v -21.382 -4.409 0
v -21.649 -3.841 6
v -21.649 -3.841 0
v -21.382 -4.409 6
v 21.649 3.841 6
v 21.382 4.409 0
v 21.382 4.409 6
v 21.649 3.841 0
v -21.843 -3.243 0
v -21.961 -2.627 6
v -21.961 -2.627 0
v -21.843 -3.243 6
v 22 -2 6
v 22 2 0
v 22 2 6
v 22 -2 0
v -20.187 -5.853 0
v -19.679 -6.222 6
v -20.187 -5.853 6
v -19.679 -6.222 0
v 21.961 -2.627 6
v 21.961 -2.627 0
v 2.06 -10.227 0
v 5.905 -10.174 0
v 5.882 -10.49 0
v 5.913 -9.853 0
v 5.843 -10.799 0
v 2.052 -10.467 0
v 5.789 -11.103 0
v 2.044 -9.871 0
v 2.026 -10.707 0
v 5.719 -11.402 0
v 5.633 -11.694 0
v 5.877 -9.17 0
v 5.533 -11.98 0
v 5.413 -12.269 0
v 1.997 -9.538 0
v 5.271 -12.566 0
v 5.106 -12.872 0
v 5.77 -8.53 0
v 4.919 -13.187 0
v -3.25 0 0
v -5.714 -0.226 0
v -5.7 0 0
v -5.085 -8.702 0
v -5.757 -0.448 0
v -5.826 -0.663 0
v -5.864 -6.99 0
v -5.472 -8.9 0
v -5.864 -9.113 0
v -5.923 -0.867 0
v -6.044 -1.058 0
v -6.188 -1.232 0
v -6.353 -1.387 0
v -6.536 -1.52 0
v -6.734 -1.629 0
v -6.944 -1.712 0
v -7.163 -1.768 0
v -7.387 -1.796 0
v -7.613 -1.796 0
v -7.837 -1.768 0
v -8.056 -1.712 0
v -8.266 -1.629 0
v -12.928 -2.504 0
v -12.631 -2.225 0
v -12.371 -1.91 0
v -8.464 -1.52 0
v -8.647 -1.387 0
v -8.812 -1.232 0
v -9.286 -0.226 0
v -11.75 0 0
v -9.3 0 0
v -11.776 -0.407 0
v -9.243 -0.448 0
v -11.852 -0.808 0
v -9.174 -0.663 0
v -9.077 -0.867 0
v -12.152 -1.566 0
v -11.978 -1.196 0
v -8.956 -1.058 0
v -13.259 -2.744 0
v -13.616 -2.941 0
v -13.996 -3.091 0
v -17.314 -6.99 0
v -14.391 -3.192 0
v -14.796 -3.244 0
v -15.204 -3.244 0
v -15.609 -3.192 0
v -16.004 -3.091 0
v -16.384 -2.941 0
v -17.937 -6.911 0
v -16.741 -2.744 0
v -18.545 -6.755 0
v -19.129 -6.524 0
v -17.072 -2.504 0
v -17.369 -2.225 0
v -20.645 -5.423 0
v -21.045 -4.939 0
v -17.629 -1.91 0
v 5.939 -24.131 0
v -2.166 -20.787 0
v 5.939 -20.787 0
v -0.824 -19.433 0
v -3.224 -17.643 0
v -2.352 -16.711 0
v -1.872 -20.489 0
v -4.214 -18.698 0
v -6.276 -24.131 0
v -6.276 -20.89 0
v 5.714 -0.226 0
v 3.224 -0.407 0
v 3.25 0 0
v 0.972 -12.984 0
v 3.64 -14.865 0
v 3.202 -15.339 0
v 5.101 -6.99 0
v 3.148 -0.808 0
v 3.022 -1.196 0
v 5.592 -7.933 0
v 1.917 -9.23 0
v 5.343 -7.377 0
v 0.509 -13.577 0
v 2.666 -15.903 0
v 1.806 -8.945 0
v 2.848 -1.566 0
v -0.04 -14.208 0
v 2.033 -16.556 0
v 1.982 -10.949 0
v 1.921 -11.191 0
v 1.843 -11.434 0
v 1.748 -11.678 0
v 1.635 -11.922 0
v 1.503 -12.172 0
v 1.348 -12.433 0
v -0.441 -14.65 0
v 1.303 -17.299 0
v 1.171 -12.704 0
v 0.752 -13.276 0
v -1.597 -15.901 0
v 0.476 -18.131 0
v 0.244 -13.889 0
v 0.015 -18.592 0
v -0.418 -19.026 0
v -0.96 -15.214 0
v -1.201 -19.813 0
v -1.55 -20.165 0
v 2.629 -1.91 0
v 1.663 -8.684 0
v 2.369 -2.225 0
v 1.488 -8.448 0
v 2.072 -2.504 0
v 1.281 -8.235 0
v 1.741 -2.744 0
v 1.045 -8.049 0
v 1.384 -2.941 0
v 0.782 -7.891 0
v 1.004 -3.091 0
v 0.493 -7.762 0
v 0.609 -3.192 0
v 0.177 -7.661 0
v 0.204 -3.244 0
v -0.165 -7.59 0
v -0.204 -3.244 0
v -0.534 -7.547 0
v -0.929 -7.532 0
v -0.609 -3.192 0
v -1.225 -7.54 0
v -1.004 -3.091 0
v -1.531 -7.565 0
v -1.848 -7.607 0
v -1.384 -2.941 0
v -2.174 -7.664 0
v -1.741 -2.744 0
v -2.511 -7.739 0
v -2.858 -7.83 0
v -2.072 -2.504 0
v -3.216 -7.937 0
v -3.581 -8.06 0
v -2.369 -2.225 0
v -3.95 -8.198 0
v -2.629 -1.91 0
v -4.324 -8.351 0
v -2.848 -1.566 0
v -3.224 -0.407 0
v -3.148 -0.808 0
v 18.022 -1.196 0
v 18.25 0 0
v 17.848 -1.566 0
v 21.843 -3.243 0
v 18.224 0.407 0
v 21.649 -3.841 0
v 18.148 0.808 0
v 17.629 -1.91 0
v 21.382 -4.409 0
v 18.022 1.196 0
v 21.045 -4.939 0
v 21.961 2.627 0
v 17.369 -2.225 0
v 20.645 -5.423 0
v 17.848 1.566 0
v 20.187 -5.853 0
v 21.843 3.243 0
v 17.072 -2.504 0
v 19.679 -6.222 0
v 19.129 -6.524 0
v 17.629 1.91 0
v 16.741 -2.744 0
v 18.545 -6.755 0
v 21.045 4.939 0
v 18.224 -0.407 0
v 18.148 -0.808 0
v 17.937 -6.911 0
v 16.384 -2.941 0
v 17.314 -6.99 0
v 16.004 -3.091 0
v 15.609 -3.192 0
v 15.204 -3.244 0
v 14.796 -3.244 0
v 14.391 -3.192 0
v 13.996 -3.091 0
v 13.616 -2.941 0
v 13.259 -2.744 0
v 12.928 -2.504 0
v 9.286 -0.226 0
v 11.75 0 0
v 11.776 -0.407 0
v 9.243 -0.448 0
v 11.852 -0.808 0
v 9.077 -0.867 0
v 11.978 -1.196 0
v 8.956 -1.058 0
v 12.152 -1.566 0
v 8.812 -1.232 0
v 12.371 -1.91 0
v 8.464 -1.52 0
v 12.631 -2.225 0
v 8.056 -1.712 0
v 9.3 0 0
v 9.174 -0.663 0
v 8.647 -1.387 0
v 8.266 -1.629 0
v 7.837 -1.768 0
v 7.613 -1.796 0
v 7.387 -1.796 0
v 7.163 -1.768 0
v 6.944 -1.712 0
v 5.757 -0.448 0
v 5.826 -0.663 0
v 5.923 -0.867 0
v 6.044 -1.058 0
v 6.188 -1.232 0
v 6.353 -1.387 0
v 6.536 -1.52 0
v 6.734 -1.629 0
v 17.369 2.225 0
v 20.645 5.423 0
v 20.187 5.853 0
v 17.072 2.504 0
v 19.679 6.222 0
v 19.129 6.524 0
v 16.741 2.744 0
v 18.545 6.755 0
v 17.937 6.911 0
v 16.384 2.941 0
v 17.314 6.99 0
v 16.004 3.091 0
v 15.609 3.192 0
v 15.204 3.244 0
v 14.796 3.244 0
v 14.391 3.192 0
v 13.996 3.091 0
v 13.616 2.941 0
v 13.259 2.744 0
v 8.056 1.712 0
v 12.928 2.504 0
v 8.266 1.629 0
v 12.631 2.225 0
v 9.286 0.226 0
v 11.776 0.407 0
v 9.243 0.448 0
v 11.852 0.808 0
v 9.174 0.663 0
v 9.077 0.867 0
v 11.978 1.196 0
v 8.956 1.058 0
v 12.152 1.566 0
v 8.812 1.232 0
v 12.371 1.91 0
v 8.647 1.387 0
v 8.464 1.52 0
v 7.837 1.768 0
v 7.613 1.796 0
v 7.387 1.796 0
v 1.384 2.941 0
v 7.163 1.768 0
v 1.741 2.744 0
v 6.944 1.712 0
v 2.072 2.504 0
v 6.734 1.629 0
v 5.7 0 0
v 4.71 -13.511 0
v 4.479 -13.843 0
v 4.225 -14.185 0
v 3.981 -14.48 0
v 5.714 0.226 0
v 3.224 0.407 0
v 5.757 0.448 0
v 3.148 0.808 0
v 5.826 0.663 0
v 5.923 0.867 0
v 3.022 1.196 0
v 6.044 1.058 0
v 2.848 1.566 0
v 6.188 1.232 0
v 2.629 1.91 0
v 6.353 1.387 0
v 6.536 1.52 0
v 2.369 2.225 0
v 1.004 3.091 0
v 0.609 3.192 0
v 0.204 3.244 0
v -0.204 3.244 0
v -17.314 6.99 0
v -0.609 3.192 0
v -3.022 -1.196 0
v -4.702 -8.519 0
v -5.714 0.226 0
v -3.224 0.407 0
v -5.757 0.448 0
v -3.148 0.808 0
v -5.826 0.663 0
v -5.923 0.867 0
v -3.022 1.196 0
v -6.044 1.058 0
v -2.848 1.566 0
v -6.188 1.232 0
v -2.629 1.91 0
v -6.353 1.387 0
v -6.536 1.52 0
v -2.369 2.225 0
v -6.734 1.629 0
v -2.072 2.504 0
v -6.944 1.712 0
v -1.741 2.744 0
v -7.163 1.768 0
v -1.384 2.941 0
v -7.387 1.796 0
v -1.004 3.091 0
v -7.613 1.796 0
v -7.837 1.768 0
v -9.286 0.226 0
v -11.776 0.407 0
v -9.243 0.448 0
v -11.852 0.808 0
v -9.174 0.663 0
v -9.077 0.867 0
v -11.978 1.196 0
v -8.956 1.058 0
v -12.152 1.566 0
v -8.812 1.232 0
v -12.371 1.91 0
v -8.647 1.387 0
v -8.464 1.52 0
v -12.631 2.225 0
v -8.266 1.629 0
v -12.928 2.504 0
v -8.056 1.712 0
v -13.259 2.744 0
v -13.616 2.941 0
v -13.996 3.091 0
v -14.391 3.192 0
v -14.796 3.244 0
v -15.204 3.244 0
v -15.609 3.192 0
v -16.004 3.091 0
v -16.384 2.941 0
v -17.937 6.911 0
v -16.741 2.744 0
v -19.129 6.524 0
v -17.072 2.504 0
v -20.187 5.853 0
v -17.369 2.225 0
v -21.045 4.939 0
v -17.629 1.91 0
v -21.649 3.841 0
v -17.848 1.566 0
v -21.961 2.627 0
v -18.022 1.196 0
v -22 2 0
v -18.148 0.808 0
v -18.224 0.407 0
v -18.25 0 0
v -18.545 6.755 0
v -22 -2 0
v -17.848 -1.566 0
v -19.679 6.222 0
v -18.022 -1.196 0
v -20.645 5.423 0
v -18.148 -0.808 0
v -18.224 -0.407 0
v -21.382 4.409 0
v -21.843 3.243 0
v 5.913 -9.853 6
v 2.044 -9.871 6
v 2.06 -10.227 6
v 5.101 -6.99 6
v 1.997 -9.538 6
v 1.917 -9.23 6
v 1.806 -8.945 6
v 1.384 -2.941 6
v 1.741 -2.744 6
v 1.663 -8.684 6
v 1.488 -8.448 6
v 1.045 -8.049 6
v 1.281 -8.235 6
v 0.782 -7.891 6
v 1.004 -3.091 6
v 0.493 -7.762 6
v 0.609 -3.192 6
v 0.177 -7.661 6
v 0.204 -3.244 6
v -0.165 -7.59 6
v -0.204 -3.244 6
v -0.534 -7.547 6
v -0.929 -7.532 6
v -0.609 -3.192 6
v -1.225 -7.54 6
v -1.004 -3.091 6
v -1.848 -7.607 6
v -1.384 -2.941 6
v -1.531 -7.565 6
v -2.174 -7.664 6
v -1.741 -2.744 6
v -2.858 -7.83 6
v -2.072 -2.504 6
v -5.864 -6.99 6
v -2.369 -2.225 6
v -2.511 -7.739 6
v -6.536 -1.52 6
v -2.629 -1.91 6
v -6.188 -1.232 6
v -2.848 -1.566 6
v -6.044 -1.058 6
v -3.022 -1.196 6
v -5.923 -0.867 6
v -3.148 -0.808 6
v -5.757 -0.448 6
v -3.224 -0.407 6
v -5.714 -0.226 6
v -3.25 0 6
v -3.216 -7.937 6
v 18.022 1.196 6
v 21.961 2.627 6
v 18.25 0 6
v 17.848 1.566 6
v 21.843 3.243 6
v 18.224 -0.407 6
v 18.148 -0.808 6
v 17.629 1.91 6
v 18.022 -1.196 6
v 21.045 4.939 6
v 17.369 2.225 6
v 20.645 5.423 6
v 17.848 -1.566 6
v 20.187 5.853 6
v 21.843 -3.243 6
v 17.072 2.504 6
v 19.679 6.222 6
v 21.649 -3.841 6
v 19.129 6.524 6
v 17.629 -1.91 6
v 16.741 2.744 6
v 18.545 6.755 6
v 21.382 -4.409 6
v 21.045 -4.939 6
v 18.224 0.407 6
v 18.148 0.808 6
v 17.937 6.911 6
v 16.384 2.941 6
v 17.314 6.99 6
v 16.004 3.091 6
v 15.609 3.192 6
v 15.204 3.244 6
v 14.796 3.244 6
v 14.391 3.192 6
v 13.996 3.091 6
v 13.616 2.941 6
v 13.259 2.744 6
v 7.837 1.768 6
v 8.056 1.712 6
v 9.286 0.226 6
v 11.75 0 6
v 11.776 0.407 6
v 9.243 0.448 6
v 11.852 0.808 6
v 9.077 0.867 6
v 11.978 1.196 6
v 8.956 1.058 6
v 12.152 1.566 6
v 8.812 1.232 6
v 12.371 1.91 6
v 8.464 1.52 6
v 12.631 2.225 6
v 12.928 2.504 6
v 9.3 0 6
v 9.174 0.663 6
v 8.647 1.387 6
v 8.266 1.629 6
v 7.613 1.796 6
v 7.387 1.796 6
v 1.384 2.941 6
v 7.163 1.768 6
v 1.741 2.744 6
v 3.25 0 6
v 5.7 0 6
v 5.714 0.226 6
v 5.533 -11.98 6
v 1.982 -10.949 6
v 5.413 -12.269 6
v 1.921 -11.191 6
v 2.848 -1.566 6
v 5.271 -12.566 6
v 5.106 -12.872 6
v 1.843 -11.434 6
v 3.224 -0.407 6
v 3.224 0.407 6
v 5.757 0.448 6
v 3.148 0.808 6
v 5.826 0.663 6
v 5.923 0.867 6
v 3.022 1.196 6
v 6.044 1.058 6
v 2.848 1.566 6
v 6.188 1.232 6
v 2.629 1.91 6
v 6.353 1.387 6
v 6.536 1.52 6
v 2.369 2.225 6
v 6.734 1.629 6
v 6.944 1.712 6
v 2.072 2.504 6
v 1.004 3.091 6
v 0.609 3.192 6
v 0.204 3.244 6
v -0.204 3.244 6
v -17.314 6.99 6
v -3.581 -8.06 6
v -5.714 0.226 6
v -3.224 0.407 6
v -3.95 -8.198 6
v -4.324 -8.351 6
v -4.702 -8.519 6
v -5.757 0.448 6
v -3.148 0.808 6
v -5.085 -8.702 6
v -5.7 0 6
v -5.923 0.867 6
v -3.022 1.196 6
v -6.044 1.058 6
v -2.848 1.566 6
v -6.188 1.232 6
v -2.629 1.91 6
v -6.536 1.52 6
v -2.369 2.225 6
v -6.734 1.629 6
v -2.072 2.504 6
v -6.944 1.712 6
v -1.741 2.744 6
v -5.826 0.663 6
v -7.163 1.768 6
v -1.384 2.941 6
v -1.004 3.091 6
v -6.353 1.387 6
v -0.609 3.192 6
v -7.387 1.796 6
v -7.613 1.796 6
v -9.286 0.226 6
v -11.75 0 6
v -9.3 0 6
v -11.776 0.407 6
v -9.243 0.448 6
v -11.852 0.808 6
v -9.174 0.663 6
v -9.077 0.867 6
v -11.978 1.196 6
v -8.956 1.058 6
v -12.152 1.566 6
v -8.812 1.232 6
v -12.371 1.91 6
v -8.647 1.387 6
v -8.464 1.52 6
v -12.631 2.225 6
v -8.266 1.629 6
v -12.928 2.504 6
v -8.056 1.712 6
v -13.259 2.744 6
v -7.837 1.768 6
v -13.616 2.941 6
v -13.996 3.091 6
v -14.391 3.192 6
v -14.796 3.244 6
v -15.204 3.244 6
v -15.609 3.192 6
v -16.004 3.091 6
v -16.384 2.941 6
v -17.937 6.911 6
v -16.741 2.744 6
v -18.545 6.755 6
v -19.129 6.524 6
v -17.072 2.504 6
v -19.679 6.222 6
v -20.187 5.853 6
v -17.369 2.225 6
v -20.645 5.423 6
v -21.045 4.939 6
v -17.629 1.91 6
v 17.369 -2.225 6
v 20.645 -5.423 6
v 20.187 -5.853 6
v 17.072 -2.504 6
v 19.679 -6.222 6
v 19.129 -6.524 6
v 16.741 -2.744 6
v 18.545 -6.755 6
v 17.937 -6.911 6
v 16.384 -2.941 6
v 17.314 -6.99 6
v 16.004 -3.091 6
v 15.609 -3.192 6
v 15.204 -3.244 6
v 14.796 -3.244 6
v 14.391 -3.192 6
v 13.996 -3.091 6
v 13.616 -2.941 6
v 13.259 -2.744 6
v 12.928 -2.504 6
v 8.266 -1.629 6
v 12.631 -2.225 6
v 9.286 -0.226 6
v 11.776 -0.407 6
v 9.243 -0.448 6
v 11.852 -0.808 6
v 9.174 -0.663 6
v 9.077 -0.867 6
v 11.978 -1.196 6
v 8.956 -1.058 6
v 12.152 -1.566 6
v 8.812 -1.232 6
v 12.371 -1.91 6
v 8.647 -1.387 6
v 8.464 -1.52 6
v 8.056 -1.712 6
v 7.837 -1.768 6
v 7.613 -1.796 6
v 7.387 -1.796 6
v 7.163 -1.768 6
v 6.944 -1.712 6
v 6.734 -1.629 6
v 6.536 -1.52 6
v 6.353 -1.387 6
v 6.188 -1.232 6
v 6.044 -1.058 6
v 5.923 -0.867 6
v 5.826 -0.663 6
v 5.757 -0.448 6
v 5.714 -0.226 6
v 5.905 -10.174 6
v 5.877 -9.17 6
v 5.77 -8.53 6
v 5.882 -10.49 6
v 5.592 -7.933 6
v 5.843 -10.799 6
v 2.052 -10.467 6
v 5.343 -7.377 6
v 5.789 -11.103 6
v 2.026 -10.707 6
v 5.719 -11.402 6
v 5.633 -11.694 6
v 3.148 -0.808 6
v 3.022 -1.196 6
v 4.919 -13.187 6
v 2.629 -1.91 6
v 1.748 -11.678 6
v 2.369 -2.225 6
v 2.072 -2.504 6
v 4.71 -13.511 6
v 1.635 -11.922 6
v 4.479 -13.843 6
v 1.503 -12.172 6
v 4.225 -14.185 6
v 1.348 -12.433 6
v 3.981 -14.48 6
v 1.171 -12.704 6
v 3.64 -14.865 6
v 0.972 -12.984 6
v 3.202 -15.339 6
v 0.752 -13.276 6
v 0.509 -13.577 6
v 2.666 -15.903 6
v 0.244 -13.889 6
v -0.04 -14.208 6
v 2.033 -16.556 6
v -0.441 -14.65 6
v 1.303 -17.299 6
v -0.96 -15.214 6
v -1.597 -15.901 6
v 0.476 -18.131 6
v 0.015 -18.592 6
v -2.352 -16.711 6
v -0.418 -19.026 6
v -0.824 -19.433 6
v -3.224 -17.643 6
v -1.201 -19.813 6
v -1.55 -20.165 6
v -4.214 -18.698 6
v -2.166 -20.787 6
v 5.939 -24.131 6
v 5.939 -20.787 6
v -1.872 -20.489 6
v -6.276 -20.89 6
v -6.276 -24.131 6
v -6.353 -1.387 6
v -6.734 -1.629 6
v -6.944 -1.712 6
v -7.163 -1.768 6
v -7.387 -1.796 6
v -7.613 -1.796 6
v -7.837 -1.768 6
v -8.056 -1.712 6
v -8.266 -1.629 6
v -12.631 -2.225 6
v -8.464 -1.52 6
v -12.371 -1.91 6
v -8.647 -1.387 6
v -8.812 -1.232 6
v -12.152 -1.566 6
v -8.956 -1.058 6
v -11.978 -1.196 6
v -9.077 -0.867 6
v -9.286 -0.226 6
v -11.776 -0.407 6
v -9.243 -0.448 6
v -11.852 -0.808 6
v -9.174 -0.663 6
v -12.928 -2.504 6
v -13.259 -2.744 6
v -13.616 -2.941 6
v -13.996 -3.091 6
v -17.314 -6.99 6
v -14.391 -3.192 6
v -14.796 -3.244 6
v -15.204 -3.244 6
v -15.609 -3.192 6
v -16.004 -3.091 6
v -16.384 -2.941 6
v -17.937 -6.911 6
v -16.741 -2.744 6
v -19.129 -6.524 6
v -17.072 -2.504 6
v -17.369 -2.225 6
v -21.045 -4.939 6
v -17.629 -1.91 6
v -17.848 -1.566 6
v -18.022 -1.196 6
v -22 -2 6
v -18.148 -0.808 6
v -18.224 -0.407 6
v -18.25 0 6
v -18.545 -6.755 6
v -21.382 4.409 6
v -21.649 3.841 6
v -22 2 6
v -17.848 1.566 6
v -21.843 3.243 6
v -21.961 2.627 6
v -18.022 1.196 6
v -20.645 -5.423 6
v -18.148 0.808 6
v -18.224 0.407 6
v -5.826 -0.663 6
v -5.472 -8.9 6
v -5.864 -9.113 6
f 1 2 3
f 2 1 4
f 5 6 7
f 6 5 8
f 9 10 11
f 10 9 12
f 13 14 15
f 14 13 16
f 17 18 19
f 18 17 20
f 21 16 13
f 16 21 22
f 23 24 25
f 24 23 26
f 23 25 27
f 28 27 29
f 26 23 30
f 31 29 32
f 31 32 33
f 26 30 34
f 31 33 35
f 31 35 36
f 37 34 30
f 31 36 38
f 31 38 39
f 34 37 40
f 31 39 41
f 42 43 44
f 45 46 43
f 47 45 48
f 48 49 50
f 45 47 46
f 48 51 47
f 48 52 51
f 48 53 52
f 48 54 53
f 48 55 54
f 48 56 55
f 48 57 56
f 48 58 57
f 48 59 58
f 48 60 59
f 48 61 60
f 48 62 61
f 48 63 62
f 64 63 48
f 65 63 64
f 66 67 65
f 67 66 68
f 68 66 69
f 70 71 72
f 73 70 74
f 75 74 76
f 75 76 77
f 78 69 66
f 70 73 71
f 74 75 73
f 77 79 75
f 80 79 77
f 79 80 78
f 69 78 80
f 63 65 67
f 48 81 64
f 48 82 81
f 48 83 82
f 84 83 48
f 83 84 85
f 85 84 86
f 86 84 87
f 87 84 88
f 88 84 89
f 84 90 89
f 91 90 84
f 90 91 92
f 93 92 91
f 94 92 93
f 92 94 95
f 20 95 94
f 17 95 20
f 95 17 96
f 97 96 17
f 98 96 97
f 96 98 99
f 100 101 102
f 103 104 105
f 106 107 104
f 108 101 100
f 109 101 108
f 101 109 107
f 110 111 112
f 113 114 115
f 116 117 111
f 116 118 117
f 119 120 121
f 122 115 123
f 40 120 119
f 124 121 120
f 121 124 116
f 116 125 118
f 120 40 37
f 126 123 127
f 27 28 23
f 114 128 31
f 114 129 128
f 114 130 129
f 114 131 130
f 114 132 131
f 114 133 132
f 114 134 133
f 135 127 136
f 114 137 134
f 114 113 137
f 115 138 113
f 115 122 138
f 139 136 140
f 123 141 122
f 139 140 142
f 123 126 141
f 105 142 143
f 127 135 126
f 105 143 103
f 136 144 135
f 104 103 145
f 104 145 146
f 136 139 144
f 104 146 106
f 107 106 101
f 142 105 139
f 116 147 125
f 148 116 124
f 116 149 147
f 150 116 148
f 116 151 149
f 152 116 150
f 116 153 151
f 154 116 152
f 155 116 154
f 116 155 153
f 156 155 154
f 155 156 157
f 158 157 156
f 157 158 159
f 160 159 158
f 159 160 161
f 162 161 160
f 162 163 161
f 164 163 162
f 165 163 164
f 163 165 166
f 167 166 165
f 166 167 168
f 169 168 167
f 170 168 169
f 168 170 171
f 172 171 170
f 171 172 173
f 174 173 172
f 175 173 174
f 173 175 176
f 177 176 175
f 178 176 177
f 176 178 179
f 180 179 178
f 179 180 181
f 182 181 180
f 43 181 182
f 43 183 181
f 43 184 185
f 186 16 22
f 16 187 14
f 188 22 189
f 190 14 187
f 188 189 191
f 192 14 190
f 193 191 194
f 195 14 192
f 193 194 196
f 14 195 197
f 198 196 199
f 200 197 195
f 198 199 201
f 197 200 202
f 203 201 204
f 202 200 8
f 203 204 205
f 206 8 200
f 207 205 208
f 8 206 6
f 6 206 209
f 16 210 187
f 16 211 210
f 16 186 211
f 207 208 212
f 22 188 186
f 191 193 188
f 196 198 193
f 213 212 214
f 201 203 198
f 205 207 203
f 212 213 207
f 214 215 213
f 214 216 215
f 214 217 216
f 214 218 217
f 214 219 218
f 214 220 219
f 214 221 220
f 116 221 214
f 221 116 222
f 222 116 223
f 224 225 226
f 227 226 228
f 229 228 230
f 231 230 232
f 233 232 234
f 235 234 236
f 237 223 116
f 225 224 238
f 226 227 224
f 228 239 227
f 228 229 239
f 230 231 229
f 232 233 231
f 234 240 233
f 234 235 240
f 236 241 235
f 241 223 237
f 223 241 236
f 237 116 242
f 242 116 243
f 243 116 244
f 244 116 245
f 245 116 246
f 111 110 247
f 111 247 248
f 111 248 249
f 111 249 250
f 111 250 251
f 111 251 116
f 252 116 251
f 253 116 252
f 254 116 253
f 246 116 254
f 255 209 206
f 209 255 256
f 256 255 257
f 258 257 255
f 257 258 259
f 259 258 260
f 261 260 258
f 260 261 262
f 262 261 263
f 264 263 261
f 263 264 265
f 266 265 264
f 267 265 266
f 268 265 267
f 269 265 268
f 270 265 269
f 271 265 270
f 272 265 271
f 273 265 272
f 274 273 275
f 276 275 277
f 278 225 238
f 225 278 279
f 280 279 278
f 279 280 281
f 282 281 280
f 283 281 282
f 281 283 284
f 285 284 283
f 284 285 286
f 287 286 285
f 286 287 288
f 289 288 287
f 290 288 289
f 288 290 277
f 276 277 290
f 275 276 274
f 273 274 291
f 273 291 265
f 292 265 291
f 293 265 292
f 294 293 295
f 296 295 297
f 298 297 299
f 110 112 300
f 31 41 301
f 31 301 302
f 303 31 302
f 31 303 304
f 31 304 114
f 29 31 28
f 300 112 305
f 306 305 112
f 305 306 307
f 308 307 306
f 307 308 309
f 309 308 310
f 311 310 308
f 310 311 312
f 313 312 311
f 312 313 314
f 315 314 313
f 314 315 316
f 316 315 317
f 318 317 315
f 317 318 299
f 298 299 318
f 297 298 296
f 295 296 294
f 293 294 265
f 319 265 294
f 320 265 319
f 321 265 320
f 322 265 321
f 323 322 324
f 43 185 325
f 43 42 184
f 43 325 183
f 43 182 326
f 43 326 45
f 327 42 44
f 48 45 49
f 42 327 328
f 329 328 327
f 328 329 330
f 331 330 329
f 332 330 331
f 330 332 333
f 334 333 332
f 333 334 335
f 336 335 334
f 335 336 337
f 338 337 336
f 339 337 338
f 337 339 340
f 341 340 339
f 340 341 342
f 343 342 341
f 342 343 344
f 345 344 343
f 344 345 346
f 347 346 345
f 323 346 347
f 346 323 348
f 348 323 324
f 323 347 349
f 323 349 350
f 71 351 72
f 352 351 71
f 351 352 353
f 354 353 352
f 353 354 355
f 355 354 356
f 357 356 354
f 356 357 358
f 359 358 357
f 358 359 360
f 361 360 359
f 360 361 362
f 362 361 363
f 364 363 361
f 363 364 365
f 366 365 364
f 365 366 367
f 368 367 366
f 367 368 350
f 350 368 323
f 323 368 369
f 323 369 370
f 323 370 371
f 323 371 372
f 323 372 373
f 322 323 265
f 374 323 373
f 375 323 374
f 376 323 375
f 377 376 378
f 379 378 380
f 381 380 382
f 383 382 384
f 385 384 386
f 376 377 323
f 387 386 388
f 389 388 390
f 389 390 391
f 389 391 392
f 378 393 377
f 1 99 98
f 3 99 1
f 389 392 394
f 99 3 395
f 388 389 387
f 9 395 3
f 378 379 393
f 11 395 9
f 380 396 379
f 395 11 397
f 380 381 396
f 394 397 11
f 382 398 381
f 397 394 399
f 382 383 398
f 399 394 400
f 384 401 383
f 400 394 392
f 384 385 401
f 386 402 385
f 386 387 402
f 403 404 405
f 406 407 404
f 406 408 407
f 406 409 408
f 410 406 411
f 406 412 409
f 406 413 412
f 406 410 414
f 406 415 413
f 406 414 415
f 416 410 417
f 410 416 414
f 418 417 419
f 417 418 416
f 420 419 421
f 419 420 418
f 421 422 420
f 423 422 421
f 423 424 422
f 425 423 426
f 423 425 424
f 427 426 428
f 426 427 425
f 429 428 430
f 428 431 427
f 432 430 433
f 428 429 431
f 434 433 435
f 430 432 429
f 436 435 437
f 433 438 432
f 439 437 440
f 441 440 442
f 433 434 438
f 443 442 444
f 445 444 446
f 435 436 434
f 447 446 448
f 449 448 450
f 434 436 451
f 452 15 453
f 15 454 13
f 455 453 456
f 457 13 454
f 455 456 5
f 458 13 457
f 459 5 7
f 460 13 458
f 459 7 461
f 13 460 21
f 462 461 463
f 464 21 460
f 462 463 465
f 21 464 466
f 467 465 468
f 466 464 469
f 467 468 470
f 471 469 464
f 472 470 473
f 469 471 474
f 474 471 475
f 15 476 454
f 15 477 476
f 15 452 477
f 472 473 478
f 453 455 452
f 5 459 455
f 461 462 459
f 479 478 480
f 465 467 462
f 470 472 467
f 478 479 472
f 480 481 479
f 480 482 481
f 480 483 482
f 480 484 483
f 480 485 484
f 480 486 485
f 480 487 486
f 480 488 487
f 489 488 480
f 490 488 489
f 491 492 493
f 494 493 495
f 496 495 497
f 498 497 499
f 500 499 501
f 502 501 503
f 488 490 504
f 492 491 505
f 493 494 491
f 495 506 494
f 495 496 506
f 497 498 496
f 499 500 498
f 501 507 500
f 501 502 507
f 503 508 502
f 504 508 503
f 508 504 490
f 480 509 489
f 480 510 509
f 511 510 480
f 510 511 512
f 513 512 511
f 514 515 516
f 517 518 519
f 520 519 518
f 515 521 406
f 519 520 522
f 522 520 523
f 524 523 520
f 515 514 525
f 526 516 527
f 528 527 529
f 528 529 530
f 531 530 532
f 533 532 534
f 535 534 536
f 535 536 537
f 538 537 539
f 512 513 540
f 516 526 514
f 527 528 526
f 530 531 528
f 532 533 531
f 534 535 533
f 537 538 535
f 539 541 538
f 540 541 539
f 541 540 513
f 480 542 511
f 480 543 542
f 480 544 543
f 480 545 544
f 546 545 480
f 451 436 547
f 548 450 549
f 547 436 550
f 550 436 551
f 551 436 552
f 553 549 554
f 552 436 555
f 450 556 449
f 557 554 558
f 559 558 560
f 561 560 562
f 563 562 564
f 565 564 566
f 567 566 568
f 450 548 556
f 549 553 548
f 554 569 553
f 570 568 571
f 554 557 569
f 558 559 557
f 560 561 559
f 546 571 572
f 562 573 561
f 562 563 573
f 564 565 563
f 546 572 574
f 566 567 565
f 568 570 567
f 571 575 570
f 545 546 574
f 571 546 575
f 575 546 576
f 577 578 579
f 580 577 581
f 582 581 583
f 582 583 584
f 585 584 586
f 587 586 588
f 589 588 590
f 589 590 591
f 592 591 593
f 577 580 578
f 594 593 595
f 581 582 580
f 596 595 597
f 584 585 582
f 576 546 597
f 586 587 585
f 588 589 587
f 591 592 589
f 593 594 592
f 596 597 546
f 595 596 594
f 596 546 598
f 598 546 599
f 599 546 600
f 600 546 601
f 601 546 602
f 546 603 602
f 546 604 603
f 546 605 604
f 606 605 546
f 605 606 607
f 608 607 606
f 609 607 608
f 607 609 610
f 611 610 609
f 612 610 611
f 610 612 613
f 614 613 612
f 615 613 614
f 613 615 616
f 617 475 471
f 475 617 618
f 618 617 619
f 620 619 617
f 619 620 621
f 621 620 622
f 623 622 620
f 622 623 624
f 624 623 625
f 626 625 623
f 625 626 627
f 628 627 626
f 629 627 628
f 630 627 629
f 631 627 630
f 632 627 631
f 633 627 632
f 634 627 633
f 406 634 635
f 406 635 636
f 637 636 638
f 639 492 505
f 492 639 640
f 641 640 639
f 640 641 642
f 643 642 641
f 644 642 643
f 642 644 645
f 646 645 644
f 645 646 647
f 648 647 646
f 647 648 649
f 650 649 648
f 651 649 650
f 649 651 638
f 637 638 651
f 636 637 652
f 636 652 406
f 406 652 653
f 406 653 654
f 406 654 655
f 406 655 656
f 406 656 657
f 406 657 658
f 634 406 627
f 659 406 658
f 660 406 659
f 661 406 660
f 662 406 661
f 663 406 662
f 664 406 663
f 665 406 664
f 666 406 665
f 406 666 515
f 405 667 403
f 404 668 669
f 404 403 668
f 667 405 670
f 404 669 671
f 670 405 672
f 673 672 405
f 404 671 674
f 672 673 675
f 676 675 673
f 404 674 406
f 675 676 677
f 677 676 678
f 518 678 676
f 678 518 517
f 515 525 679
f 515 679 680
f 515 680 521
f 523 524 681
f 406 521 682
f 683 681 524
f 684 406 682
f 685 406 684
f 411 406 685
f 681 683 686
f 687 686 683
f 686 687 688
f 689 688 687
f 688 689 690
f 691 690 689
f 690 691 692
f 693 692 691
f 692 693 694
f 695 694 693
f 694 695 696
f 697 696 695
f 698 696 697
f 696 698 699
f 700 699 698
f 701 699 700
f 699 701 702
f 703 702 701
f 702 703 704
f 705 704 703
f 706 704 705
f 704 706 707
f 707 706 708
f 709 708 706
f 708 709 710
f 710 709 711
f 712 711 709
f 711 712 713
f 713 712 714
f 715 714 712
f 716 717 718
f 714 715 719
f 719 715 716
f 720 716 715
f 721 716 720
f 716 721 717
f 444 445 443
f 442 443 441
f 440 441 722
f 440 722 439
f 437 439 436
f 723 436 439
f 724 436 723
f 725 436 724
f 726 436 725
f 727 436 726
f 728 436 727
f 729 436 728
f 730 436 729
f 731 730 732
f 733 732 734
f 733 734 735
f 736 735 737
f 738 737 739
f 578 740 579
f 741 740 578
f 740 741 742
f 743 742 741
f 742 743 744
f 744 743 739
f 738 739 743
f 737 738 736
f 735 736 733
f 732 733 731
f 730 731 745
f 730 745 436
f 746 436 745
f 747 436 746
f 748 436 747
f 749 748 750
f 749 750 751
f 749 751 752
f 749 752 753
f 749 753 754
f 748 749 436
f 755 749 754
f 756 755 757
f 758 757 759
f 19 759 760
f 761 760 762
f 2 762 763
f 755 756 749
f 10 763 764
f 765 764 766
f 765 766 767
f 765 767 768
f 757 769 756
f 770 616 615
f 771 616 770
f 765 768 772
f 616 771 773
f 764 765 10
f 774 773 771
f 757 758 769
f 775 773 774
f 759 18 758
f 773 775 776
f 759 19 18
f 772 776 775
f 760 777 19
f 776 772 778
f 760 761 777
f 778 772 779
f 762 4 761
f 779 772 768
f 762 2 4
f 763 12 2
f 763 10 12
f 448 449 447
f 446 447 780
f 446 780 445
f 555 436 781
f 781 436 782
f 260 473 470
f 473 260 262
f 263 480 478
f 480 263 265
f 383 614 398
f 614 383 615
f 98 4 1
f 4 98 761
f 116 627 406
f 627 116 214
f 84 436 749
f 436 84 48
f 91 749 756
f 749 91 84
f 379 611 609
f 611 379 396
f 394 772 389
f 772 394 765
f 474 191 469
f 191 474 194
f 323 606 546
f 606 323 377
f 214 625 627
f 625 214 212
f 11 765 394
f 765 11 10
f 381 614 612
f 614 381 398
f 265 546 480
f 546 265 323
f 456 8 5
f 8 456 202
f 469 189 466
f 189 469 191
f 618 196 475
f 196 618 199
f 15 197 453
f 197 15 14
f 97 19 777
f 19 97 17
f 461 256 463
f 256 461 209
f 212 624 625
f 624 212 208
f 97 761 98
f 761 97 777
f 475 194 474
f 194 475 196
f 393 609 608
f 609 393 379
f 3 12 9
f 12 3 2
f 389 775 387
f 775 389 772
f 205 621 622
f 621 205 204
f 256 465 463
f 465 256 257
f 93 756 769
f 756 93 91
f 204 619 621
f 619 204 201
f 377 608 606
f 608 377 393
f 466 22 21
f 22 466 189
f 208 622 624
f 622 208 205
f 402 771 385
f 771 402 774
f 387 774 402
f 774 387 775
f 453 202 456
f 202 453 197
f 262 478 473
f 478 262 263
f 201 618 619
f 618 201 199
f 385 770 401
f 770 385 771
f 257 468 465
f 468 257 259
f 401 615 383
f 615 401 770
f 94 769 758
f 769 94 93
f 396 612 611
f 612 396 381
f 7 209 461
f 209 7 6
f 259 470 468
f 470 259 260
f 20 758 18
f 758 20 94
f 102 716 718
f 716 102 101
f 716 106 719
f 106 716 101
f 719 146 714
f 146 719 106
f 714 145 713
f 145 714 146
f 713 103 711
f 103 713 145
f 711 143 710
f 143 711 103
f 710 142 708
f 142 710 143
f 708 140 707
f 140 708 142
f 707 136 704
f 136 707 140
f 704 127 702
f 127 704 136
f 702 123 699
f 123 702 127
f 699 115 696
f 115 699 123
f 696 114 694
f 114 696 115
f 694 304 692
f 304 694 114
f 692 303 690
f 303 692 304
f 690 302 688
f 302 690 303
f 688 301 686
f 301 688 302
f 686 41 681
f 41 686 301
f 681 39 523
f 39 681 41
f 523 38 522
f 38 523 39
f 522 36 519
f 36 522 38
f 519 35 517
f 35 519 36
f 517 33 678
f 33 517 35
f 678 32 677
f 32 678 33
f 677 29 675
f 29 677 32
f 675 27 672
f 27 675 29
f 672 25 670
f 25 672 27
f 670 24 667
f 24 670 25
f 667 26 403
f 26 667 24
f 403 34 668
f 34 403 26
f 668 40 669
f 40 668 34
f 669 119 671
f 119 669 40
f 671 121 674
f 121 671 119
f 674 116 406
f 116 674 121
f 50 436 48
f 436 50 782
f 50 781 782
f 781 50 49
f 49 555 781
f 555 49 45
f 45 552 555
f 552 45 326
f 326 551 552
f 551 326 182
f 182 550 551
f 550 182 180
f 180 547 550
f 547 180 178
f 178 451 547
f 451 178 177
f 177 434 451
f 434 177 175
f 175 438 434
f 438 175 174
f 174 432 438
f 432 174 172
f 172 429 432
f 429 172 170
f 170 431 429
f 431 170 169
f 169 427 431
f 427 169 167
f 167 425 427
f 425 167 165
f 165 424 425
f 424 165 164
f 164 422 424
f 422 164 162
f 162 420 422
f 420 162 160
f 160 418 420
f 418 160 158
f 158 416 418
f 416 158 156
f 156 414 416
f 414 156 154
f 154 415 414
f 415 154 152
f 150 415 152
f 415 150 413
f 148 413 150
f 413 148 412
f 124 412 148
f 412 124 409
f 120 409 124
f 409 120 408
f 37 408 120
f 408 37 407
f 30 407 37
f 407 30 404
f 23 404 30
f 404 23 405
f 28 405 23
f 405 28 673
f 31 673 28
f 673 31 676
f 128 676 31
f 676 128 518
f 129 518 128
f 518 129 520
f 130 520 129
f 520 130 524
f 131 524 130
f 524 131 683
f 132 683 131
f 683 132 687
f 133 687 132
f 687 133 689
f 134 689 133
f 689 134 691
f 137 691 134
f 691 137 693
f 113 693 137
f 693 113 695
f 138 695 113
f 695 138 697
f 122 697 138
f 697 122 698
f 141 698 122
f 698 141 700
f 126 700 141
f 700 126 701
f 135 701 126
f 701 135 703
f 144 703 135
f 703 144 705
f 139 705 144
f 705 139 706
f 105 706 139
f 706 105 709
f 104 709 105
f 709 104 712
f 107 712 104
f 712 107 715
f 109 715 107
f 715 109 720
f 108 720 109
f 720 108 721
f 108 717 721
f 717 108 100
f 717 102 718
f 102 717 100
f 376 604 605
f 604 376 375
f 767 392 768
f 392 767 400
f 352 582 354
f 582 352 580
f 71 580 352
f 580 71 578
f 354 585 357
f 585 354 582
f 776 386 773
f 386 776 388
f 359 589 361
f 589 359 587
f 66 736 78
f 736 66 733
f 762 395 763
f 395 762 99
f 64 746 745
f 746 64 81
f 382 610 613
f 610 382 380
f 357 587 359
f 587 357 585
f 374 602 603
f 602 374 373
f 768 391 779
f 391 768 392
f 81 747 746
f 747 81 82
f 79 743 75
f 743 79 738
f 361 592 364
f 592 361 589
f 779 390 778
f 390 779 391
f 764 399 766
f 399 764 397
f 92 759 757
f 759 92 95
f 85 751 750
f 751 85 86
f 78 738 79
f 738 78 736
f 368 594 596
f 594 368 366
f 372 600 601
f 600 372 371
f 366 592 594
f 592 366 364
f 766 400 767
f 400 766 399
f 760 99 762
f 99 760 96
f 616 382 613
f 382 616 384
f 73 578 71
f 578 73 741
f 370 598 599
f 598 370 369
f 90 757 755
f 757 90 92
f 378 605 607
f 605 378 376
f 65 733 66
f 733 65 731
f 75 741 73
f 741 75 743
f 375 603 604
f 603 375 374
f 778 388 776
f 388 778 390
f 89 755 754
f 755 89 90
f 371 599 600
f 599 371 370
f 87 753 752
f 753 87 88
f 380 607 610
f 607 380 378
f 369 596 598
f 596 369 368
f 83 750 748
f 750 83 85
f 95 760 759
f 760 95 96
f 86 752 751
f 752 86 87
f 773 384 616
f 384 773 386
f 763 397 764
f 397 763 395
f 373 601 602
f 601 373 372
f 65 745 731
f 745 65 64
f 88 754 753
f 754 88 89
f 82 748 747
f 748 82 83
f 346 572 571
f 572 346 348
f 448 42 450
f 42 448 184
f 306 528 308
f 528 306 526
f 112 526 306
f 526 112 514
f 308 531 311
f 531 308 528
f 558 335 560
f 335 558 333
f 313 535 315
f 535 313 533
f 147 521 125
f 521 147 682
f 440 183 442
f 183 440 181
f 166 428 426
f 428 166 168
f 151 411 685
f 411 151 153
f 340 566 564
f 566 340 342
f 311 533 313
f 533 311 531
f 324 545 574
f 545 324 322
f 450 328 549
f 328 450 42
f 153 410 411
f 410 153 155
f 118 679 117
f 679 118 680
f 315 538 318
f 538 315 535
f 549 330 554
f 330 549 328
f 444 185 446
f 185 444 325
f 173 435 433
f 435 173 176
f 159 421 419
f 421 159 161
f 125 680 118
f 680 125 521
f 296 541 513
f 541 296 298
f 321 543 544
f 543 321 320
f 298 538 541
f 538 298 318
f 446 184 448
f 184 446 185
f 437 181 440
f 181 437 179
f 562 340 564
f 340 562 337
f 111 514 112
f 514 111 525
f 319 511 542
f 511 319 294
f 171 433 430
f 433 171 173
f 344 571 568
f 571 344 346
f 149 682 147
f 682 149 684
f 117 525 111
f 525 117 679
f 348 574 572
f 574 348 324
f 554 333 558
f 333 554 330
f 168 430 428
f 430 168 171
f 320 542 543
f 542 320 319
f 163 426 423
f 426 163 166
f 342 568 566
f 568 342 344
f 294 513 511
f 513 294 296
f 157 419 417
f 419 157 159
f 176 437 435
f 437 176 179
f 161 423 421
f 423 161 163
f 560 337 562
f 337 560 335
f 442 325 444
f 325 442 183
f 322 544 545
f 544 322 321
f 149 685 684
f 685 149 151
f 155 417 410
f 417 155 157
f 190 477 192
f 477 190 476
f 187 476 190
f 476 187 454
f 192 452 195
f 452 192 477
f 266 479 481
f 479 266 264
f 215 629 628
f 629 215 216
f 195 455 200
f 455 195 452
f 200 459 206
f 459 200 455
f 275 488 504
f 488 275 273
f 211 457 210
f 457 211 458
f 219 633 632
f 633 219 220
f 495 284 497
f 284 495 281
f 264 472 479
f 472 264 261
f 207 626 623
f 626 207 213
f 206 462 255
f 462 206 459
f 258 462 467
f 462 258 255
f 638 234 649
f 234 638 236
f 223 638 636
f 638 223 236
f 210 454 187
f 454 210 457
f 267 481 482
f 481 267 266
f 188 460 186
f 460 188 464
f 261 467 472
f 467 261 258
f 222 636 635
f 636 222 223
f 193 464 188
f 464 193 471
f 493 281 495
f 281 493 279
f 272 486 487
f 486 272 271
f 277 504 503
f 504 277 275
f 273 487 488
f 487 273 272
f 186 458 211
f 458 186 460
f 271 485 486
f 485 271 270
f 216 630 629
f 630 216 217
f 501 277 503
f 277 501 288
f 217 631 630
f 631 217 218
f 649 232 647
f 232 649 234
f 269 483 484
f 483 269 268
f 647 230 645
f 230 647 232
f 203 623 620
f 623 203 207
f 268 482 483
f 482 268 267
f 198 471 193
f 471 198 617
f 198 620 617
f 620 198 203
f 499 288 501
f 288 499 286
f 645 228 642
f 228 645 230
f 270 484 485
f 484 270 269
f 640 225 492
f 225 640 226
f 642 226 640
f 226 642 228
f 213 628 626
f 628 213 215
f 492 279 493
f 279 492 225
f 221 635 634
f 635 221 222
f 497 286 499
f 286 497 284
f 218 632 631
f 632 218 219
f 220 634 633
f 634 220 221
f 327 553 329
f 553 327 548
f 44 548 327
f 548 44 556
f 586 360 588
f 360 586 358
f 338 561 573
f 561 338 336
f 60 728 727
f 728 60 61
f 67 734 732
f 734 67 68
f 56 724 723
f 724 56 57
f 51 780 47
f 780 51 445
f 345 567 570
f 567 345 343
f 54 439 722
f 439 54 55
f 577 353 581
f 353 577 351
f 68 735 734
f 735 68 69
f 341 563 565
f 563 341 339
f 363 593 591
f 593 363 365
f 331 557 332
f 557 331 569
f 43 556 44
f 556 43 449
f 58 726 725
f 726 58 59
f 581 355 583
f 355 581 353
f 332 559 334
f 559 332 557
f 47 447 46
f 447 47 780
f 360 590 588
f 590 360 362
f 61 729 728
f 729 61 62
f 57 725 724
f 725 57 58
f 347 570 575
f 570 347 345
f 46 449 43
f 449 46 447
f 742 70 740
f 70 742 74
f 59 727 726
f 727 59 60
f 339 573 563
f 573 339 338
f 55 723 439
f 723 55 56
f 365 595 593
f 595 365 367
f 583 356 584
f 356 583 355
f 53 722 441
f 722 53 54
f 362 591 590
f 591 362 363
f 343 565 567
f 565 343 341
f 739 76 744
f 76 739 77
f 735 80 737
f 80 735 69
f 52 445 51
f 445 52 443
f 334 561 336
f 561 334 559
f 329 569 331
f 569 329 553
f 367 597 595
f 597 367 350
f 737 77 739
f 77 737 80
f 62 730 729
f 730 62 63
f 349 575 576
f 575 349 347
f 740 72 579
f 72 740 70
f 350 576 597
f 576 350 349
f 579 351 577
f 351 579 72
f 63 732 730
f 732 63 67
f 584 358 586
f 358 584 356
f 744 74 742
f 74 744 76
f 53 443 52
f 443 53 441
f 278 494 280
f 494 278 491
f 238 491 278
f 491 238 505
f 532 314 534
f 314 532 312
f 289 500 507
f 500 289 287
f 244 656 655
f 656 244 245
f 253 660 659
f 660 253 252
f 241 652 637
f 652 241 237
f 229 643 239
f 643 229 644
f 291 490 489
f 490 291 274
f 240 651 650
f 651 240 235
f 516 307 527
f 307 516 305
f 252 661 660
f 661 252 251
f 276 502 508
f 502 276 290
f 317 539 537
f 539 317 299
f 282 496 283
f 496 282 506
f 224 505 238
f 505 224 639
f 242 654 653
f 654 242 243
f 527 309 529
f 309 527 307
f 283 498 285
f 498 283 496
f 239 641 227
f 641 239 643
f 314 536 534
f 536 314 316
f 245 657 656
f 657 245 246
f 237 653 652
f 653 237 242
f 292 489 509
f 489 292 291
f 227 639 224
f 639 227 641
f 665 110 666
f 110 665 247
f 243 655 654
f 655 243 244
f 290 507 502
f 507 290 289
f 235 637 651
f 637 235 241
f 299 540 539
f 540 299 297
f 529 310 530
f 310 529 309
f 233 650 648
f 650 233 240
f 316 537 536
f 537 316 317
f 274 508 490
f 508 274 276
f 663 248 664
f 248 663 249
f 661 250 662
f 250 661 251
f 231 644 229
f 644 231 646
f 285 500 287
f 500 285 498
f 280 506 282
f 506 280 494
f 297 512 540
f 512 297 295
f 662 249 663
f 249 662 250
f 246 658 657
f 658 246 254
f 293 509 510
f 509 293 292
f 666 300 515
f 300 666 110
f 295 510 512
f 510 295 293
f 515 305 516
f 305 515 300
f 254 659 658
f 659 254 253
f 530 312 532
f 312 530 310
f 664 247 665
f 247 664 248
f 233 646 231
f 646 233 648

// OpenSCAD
$fn = 50;


difference() {
	union() {
		hull() {
			translate(v = [-17.0000000000, 2.0000000000, 0]) {
				cylinder(h = 6, r = 5);
			}
			translate(v = [17.0000000000, 2.0000000000, 0]) {
				cylinder(h = 6, r = 5);
			}
			translate(v = [-17.0000000000, -2.0000000000, 0]) {
				cylinder(h = 6, r = 5);
			}
			translate(v = [17.0000000000, -2.0000000000, 0]) {
				cylinder(h = 6, r = 5);
			}
		}
		translate(v = [0, -5, 0]) {
			linear_extrude(height = 6) {
				text(font = "DejaVu Sans Mono:style=Bold", halign = "center", size = 19.0000000000, text = "2", valign = "top");
			}
		}
	}
	union() {
		translate(v = [-15.0000000000, 0.0000000000, 0]) {
			translate(v = [0, 0, -100]) {
				cylinder(h = 200, r = 3.2500000000);
			}
		}
		translate(v = [0, 0, -100]) {
			cylinder(h = 200, r = 3.2500000000);
		}
		translate(v = [15.0000000000, 0.0000000000, 0]) {
			translate(v = [0, 0, -100]) {
				cylinder(h = 200, r = 3.2500000000);
			}
		}
		translate(v = [-15.0000000000, 0.0000000000, 0]) {
			translate(v = [0, 0, -100]) {
				cylinder(h = 200, r = 1.8000000000);
			}
		}
		translate(v = [-7.5000000000, 0.0000000000, 0]) {
			translate(v = [0, 0, -100]) {
				cylinder(h = 200, r = 1.8000000000);
			}
		}
		translate(v = [0, 0, -100]) {
			cylinder(h = 200, r = 1.8000000000);
		}
		translate(v = [7.5000000000, 0.0000000000, 0]) {
			translate(v = [0, 0, -100]) {
				cylinder(h = 200, r = 1.8000000000);
			}
		}
		translate(v = [15.0000000000, 0.0000000000, 0]) {
			translate(v = [0, 0, -100]) {
				cylinder(h = 200, r = 1.8000000000);
			}
		}
	}
}
